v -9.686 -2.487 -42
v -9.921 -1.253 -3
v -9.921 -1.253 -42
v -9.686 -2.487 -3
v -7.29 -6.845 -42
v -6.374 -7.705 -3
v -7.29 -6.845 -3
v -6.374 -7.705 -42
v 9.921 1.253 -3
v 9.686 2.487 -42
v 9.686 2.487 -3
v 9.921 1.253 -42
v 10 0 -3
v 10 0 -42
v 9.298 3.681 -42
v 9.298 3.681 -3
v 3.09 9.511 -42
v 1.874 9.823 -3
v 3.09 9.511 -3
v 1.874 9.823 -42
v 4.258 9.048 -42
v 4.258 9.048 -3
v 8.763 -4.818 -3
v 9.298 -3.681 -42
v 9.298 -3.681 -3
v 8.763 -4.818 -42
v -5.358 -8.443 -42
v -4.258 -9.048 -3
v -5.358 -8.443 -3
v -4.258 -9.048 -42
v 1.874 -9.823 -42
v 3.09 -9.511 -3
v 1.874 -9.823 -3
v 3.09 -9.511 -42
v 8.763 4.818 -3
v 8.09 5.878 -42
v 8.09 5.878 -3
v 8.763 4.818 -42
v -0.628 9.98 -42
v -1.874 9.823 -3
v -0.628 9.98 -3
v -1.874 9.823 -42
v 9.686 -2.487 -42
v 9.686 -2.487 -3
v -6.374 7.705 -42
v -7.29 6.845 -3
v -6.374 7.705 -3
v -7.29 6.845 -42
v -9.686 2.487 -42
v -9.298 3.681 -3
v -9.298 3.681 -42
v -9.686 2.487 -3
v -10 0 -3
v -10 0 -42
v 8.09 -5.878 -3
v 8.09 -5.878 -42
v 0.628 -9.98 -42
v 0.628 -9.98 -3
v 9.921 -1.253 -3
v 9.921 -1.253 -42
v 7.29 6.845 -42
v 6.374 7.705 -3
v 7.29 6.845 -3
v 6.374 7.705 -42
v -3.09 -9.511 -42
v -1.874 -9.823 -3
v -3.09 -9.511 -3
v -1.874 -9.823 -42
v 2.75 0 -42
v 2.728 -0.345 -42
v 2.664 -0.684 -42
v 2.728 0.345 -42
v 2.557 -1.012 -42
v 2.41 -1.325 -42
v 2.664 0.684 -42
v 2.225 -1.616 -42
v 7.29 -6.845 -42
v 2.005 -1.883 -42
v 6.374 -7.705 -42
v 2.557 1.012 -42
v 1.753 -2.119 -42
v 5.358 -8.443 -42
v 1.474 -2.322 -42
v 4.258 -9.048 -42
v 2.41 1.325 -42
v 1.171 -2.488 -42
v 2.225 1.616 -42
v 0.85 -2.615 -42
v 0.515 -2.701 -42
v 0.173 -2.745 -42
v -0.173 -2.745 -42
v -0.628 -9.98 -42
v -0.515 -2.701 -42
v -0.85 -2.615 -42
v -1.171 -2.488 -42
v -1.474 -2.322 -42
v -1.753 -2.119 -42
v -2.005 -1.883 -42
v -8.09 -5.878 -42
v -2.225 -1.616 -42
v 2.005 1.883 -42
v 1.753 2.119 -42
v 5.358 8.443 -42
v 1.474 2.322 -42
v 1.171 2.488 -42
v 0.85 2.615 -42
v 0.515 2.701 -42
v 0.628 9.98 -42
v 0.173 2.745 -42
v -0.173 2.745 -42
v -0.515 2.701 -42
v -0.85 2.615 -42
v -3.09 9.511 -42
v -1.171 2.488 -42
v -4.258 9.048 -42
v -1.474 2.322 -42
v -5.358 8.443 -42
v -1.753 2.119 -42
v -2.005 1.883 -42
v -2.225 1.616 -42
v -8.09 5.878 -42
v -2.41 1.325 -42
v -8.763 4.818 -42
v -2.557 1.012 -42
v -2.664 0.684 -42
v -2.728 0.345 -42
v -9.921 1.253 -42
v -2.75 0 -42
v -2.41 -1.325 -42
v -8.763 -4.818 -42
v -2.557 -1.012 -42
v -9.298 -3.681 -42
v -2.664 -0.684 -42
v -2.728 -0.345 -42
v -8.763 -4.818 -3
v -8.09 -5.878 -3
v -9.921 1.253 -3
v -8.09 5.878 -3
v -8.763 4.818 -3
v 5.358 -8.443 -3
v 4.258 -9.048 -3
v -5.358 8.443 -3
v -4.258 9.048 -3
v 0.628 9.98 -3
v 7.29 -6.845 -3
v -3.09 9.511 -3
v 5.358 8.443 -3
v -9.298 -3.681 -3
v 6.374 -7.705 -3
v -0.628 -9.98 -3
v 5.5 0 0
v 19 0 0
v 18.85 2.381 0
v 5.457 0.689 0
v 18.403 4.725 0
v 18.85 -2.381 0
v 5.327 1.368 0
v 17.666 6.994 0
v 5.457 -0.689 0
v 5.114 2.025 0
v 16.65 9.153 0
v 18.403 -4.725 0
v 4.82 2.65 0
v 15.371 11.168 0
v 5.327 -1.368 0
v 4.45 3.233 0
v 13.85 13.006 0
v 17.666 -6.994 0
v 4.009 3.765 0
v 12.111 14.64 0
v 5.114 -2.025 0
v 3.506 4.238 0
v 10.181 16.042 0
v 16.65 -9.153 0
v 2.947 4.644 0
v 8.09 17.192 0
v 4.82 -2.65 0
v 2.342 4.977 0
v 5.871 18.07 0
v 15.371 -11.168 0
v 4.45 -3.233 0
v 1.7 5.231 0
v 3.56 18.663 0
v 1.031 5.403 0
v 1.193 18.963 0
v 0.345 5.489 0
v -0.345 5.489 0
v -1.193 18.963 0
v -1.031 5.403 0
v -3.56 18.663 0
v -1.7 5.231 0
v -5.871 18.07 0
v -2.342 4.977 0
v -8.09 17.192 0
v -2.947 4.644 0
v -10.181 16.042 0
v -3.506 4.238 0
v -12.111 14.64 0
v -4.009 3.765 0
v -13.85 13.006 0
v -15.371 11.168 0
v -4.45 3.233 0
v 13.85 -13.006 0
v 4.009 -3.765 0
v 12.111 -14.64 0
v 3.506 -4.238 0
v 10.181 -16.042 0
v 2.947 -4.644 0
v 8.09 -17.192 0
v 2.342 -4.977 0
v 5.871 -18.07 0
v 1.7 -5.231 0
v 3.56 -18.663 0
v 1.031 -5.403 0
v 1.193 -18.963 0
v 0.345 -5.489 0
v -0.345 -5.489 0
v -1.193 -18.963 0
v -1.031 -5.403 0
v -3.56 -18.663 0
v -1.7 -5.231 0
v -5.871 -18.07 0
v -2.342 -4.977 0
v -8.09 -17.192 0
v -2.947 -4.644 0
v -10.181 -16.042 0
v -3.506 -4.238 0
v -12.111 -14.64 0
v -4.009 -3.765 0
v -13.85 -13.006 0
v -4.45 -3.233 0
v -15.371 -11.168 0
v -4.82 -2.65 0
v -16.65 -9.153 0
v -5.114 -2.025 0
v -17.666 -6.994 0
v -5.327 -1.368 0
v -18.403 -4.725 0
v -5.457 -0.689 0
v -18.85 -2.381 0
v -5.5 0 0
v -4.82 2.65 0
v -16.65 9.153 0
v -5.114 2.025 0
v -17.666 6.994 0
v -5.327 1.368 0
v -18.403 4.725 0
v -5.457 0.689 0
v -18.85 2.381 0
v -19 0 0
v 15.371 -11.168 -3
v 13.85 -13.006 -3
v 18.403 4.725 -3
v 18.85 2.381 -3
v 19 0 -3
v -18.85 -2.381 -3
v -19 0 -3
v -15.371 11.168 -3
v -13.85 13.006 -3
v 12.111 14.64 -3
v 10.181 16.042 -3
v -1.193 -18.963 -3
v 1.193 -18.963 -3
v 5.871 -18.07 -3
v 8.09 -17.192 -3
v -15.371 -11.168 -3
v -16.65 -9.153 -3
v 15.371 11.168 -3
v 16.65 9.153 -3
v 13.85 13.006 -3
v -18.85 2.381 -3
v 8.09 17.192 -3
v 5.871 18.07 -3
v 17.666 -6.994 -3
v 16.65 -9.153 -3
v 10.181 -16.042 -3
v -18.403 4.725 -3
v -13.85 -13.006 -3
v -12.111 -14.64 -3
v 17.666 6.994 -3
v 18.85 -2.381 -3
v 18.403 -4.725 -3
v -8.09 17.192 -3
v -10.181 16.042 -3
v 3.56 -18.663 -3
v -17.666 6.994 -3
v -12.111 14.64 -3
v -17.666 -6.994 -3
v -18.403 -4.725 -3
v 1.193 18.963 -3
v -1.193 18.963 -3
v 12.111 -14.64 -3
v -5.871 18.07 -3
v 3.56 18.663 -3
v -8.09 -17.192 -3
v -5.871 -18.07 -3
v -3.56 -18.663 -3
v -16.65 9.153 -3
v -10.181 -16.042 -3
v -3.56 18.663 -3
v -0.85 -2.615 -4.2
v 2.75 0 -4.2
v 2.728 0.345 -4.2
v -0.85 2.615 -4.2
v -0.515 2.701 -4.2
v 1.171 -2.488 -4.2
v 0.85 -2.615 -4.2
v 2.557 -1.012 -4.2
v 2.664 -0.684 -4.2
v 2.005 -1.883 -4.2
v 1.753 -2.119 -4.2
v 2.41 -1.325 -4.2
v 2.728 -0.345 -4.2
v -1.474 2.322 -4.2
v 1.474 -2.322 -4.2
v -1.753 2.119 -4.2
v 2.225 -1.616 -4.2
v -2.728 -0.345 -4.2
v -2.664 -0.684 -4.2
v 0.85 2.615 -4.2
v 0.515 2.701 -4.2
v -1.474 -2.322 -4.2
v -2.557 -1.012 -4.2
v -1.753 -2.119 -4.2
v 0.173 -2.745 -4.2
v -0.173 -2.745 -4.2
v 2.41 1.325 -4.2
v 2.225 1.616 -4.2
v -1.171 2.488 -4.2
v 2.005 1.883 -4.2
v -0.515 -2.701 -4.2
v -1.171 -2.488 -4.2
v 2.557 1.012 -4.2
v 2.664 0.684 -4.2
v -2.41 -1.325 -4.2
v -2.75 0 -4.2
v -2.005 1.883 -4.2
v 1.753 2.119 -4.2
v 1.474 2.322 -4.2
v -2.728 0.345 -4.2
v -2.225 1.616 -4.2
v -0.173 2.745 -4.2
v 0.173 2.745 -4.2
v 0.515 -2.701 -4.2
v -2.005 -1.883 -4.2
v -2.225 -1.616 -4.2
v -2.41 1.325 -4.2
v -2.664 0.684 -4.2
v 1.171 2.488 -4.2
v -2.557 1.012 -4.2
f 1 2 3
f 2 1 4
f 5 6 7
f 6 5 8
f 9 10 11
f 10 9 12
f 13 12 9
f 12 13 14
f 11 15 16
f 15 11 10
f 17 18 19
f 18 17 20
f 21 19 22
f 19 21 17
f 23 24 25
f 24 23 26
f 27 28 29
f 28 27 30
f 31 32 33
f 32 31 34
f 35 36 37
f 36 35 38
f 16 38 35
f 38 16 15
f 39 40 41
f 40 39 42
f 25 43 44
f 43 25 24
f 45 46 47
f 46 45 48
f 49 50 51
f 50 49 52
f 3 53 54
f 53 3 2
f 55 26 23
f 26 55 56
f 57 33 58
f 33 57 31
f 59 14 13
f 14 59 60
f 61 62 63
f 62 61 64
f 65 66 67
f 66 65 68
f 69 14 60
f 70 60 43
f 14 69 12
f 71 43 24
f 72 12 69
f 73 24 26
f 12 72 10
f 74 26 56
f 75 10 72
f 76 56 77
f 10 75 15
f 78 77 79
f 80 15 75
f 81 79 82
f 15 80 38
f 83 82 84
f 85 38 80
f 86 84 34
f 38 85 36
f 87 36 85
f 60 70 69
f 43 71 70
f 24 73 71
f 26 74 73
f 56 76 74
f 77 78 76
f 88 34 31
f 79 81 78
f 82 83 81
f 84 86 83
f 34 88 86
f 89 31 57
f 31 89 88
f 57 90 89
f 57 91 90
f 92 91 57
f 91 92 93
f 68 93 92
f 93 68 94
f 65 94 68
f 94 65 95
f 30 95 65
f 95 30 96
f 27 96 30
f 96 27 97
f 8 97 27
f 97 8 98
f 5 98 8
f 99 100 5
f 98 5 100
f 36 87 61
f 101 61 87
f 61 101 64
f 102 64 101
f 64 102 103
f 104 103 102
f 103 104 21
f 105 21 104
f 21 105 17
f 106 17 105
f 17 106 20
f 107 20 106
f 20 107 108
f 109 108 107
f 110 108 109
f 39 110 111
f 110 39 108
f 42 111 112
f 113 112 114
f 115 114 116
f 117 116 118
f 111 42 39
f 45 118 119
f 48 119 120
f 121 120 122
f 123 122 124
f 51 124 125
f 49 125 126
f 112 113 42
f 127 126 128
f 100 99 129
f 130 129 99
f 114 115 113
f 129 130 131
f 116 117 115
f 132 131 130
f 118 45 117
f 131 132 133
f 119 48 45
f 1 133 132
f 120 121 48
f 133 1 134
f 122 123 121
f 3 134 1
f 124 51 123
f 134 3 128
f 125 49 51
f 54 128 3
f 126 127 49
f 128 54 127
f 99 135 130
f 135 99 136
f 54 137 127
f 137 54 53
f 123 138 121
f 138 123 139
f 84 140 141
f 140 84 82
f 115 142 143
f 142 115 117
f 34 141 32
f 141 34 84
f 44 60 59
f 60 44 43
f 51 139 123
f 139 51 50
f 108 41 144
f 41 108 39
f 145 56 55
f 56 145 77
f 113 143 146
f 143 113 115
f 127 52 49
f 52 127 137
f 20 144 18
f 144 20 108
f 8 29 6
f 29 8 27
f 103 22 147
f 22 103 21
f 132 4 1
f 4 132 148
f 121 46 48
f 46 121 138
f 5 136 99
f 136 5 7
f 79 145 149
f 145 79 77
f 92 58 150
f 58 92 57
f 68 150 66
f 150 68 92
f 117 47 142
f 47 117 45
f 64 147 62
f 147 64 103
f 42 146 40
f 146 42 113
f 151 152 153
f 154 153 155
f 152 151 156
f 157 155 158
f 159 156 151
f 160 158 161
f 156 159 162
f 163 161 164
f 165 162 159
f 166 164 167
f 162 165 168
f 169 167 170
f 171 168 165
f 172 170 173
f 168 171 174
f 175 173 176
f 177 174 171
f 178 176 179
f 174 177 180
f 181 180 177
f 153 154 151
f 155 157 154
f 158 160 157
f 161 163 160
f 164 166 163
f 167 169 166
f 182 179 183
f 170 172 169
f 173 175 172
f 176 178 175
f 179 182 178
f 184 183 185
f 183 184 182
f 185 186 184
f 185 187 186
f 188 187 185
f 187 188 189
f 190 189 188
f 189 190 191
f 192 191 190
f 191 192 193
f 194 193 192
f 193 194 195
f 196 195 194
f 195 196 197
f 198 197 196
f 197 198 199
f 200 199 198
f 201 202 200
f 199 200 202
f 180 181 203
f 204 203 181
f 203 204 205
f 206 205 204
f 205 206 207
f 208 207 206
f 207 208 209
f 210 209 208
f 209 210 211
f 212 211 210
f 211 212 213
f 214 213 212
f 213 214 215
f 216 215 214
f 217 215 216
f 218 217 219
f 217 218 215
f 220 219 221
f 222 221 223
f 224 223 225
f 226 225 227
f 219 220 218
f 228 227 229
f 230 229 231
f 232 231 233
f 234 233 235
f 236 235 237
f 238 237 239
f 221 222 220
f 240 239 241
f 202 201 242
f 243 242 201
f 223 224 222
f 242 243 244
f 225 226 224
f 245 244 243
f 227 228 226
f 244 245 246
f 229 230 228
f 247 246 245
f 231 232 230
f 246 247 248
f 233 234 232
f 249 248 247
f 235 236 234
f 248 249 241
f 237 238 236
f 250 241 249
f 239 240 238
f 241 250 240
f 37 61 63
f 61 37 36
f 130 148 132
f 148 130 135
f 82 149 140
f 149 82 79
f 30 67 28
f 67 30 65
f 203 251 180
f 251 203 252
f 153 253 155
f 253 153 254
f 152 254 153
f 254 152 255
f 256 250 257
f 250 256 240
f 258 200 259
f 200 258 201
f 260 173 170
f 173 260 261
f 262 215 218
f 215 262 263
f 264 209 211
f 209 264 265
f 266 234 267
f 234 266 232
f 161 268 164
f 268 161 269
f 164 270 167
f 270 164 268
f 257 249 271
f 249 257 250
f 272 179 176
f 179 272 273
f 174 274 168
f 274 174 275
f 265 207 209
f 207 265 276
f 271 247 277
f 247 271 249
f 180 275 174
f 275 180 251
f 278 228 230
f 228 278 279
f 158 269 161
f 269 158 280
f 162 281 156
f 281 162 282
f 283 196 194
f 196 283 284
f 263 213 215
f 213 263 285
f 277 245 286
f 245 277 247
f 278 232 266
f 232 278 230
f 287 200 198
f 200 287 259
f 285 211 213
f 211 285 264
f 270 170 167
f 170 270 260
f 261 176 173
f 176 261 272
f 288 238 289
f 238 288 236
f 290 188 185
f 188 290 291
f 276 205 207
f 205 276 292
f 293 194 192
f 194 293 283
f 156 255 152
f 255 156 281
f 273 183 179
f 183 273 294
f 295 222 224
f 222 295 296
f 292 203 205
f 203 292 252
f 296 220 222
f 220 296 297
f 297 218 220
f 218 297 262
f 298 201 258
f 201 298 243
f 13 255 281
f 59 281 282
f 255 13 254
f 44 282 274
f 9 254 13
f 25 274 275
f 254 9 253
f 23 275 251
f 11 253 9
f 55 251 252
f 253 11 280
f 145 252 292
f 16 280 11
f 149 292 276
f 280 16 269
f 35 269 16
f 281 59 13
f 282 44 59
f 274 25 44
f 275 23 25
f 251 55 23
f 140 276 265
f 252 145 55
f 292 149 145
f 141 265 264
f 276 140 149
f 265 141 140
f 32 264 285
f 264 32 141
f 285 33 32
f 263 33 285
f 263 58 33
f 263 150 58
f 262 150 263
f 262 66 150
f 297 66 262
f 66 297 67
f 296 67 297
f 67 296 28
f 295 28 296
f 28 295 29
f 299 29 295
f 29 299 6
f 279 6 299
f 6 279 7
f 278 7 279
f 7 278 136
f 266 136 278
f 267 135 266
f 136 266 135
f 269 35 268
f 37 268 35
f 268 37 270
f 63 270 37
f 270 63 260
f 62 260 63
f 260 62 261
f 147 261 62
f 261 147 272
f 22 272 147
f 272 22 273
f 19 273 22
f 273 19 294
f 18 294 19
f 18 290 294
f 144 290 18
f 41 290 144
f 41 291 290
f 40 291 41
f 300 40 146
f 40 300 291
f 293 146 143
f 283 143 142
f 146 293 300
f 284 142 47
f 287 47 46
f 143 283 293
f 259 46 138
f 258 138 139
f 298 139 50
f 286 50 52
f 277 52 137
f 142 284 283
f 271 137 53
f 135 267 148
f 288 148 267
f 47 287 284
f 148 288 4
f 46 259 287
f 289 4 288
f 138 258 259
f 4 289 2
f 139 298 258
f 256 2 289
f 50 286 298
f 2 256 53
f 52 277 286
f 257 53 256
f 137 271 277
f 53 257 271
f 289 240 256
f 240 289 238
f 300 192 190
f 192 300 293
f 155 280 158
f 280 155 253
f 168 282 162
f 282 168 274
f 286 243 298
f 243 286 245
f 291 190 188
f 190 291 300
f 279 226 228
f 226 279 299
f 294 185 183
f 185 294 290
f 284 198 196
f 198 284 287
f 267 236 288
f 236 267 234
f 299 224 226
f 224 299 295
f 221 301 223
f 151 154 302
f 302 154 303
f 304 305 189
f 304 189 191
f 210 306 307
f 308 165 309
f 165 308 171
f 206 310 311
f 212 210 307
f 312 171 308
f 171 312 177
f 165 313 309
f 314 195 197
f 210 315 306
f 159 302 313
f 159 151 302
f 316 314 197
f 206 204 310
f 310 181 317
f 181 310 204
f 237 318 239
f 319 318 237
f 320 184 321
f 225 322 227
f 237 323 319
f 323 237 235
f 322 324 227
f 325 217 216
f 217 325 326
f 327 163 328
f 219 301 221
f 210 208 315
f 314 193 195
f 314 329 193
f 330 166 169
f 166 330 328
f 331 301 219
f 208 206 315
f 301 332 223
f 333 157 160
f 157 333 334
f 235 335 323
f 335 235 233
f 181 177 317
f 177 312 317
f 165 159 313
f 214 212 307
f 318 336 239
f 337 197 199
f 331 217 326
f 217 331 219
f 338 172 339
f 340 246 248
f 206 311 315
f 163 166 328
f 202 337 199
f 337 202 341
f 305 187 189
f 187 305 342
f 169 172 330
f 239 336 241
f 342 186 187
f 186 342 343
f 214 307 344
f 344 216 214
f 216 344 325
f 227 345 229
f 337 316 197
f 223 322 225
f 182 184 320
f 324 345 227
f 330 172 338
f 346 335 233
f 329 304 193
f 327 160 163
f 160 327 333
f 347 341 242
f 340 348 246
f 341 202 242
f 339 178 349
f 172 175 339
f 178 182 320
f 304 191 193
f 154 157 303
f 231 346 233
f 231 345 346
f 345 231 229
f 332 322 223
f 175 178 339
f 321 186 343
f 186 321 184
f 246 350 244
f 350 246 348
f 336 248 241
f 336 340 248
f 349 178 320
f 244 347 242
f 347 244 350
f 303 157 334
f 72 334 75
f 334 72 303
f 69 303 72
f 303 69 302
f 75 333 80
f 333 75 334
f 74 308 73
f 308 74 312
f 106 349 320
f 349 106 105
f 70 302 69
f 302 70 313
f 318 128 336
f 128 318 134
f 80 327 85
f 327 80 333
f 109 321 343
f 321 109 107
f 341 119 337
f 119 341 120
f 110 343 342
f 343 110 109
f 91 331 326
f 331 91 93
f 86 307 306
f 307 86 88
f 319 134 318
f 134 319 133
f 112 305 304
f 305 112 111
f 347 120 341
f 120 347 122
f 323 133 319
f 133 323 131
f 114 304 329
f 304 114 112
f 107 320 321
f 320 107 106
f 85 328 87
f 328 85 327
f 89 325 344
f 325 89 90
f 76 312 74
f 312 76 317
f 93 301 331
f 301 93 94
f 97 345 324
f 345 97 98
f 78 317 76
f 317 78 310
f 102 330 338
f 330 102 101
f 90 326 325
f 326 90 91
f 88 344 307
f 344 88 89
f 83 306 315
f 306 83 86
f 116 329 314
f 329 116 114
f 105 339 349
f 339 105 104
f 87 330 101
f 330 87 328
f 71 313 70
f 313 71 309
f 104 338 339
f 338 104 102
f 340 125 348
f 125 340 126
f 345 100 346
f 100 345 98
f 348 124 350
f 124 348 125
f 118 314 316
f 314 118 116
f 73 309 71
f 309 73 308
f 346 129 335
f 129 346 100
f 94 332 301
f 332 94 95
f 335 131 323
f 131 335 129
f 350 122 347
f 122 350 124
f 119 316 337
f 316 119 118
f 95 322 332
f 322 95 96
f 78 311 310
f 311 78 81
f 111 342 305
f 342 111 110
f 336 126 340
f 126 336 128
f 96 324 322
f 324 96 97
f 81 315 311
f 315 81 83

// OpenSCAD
$fn = 50;


difference() {
	union() {
		translate(v = [0, 0, -42.0000000000]) {
			cylinder(h = 42, r = 10.0000000000);
		}
		translate(v = [0, 0, -3.0000000000]) {
			cylinder(h = 3, r = 19.0000000000);
		}
	}
	union() {
		translate(v = [0, 0, 0]) {
			rotate(a = [0, 0, 0]) {
				difference() {
					union() {
						#translate(v = [0, 0, -42.0000000000]) {
							cylinder(h = 42, r = 2.2500000000);
						}
						#translate(v = [0, 0, -4.2000000000]) {
							cylinder(h = 4.2000000000, r = 10.0000000000, r1 = 2.7500000000, r2 = 5.5000000000);
						}
						#translate(v = [0, 0, -42.0000000000]) {
							cylinder(h = 42, r = 2.7500000000);
						}
						#translate(v = [0, 0, -42.0000000000]) {
							cylinder(h = 42, r = 2.2500000000);
						}
					}
					union();
				}
			}
		}
	}
}
